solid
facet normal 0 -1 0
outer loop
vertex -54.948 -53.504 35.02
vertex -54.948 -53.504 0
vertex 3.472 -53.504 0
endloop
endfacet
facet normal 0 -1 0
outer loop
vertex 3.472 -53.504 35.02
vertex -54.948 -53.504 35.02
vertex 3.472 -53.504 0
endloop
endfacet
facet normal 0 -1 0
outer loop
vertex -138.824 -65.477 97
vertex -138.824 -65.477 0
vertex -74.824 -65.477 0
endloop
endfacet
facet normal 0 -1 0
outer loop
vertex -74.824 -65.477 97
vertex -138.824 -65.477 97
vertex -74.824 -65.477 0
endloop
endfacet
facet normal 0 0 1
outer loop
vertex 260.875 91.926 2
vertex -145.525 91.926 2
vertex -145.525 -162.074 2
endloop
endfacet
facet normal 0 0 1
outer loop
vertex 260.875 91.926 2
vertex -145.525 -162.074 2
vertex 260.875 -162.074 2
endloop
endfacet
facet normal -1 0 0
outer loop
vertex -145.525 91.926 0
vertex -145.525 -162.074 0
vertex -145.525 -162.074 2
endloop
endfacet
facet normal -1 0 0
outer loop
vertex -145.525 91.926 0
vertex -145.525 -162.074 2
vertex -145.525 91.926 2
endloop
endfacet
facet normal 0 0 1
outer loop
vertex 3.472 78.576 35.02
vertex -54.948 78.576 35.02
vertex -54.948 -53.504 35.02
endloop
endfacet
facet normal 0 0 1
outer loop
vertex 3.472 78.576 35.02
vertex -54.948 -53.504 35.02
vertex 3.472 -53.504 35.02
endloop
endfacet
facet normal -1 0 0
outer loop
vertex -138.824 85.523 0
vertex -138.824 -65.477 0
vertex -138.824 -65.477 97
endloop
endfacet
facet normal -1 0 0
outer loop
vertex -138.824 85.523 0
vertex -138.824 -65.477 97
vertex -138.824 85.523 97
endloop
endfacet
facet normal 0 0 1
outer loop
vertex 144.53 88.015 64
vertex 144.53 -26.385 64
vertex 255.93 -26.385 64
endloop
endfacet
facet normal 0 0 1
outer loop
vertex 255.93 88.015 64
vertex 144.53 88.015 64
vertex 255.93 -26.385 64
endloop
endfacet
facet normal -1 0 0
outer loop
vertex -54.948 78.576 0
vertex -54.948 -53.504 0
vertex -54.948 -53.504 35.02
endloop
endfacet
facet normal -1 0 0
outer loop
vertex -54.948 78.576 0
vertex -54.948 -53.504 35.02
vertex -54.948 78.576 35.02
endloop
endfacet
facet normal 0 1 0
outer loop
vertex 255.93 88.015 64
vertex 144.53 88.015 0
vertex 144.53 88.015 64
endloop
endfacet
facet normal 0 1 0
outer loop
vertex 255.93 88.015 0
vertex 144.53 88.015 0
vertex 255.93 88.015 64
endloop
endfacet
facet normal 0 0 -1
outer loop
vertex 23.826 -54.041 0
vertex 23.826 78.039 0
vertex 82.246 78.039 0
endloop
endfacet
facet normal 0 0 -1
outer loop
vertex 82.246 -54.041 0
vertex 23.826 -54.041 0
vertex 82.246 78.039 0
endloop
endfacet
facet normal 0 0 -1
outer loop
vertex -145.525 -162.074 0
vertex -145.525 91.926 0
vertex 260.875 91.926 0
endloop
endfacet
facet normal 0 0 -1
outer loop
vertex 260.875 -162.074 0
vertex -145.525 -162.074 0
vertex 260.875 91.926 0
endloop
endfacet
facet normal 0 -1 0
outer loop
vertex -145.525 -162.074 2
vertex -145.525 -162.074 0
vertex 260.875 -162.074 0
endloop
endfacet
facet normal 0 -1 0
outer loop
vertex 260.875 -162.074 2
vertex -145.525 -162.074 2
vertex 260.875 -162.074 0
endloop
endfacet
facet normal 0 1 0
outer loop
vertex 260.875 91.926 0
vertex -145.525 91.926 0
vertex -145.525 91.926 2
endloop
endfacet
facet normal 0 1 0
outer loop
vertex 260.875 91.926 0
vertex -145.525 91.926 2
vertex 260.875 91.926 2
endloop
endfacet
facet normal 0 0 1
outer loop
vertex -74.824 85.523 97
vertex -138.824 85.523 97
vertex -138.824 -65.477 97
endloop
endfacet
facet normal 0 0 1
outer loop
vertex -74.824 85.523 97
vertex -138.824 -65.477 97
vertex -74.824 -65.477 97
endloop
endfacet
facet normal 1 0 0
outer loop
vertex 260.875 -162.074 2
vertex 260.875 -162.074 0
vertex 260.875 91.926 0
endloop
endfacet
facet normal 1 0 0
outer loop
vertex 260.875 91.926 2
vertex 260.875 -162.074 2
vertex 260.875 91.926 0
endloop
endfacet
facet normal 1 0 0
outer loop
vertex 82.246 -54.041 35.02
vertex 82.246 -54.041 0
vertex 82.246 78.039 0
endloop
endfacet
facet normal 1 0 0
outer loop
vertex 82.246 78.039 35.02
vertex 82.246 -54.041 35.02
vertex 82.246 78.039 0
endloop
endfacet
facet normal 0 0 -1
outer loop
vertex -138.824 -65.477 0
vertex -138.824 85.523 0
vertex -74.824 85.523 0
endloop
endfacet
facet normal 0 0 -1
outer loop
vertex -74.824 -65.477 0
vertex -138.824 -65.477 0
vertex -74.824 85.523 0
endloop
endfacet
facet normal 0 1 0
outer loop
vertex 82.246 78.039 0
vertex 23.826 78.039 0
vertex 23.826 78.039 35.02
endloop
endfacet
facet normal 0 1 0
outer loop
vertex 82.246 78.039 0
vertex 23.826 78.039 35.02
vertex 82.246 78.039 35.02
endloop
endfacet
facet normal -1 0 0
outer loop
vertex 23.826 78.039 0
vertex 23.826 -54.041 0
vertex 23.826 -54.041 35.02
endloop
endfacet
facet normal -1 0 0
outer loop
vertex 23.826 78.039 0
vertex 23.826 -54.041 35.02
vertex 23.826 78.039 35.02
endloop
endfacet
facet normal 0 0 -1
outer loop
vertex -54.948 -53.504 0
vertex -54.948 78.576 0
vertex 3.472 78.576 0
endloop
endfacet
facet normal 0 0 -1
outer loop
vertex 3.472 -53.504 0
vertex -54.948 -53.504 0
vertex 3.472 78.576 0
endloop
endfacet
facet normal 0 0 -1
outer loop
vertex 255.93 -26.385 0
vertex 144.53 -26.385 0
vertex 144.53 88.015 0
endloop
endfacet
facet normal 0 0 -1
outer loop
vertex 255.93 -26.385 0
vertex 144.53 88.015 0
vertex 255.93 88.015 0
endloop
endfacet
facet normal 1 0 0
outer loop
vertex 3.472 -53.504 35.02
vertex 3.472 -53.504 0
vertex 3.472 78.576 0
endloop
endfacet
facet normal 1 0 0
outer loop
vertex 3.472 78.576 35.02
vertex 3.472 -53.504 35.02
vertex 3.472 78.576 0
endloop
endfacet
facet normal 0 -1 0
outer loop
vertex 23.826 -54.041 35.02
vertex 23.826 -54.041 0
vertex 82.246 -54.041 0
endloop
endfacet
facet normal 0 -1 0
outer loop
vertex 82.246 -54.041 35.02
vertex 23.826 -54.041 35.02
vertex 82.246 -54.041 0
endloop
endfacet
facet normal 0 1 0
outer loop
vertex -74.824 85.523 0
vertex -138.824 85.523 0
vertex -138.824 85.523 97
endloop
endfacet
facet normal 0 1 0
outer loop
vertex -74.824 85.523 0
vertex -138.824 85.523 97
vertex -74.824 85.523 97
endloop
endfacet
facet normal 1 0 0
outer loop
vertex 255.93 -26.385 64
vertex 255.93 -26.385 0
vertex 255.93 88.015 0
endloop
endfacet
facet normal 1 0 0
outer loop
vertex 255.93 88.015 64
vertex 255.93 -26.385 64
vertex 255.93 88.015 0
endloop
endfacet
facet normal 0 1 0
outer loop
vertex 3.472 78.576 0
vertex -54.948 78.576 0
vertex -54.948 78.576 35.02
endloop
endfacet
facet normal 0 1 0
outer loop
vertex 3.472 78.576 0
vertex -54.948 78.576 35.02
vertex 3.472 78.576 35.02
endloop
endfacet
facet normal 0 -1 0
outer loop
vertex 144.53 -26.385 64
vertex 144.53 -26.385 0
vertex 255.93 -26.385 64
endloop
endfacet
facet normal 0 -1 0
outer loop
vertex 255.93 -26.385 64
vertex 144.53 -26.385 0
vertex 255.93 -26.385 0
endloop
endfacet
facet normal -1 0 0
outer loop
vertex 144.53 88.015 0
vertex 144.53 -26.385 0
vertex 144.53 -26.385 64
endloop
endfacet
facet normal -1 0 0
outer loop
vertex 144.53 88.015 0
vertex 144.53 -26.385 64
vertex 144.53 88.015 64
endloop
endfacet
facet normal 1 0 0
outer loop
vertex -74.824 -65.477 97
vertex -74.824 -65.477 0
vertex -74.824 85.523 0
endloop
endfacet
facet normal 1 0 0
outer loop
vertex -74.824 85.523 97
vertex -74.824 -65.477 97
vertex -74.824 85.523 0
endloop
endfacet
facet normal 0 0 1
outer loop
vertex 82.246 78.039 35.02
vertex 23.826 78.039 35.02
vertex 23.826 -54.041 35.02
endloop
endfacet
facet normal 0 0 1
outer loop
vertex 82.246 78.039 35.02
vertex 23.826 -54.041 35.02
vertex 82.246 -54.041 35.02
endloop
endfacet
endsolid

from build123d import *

# Parameters (mm, degrees)
SKETCH_W     = 406.4
SKETCH_H     = 254
PAD_DEPTH    = 2
SKETCH001_W  = 111.4
SKETCH001_H  = 114.4
PAD001_DEPTH = 64
SKETCH002_W  = 64
SKETCH002_H  = 151
PAD002_DEPTH = 97
SKETCH003_W  = 58.42
SKETCH003_H  = 132.08
PAD003_DEPTH = 35.02
SKETCH004_W  = 58.42
SKETCH004_H  = 132.08
PAD004_DEPTH = 35.02


with BuildPart() as pad:
    # Sketch → Pad (new body)
    with BuildSketch(Plane.XY):
        with Locations((57.674634, -35.07402)):
            Rectangle(SKETCH_W, SKETCH_H)
    extrude(amount=PAD_DEPTH)


with BuildPart() as pad001:
    # Sketch001 → Pad001 (new body)
    with BuildSketch(Plane.XY):
        with Locations((200.230452, 30.81523)):
            Rectangle(SKETCH001_W, SKETCH001_H)
    extrude(amount=PAD001_DEPTH)


with BuildPart() as pad002:
    # Sketch002 → Pad002 (new body)
    with BuildSketch(Plane.XY):
        with Locations((-106.823849, 10.023213)):
            Rectangle(SKETCH002_W, SKETCH002_H)
    extrude(amount=PAD002_DEPTH)


with BuildPart() as pad003:
    # Sketch003 → Pad003 (new body)
    with BuildSketch(Plane.XY):
        with Locations((-25.738078, 12.535692)):
            Rectangle(SKETCH003_W, SKETCH003_H)
    extrude(amount=PAD003_DEPTH)


with BuildPart() as pad004:
    # Sketch004 → Pad004 (new body)
    with BuildSketch(Plane.XY):
        with Locations((53.035747, 11.999326)):
            Rectangle(SKETCH004_W, SKETCH004_H)
    extrude(amount=PAD004_DEPTH)


solid = Compound([pad.part, pad001.part, pad002.part, pad003.part, pad004.part])
